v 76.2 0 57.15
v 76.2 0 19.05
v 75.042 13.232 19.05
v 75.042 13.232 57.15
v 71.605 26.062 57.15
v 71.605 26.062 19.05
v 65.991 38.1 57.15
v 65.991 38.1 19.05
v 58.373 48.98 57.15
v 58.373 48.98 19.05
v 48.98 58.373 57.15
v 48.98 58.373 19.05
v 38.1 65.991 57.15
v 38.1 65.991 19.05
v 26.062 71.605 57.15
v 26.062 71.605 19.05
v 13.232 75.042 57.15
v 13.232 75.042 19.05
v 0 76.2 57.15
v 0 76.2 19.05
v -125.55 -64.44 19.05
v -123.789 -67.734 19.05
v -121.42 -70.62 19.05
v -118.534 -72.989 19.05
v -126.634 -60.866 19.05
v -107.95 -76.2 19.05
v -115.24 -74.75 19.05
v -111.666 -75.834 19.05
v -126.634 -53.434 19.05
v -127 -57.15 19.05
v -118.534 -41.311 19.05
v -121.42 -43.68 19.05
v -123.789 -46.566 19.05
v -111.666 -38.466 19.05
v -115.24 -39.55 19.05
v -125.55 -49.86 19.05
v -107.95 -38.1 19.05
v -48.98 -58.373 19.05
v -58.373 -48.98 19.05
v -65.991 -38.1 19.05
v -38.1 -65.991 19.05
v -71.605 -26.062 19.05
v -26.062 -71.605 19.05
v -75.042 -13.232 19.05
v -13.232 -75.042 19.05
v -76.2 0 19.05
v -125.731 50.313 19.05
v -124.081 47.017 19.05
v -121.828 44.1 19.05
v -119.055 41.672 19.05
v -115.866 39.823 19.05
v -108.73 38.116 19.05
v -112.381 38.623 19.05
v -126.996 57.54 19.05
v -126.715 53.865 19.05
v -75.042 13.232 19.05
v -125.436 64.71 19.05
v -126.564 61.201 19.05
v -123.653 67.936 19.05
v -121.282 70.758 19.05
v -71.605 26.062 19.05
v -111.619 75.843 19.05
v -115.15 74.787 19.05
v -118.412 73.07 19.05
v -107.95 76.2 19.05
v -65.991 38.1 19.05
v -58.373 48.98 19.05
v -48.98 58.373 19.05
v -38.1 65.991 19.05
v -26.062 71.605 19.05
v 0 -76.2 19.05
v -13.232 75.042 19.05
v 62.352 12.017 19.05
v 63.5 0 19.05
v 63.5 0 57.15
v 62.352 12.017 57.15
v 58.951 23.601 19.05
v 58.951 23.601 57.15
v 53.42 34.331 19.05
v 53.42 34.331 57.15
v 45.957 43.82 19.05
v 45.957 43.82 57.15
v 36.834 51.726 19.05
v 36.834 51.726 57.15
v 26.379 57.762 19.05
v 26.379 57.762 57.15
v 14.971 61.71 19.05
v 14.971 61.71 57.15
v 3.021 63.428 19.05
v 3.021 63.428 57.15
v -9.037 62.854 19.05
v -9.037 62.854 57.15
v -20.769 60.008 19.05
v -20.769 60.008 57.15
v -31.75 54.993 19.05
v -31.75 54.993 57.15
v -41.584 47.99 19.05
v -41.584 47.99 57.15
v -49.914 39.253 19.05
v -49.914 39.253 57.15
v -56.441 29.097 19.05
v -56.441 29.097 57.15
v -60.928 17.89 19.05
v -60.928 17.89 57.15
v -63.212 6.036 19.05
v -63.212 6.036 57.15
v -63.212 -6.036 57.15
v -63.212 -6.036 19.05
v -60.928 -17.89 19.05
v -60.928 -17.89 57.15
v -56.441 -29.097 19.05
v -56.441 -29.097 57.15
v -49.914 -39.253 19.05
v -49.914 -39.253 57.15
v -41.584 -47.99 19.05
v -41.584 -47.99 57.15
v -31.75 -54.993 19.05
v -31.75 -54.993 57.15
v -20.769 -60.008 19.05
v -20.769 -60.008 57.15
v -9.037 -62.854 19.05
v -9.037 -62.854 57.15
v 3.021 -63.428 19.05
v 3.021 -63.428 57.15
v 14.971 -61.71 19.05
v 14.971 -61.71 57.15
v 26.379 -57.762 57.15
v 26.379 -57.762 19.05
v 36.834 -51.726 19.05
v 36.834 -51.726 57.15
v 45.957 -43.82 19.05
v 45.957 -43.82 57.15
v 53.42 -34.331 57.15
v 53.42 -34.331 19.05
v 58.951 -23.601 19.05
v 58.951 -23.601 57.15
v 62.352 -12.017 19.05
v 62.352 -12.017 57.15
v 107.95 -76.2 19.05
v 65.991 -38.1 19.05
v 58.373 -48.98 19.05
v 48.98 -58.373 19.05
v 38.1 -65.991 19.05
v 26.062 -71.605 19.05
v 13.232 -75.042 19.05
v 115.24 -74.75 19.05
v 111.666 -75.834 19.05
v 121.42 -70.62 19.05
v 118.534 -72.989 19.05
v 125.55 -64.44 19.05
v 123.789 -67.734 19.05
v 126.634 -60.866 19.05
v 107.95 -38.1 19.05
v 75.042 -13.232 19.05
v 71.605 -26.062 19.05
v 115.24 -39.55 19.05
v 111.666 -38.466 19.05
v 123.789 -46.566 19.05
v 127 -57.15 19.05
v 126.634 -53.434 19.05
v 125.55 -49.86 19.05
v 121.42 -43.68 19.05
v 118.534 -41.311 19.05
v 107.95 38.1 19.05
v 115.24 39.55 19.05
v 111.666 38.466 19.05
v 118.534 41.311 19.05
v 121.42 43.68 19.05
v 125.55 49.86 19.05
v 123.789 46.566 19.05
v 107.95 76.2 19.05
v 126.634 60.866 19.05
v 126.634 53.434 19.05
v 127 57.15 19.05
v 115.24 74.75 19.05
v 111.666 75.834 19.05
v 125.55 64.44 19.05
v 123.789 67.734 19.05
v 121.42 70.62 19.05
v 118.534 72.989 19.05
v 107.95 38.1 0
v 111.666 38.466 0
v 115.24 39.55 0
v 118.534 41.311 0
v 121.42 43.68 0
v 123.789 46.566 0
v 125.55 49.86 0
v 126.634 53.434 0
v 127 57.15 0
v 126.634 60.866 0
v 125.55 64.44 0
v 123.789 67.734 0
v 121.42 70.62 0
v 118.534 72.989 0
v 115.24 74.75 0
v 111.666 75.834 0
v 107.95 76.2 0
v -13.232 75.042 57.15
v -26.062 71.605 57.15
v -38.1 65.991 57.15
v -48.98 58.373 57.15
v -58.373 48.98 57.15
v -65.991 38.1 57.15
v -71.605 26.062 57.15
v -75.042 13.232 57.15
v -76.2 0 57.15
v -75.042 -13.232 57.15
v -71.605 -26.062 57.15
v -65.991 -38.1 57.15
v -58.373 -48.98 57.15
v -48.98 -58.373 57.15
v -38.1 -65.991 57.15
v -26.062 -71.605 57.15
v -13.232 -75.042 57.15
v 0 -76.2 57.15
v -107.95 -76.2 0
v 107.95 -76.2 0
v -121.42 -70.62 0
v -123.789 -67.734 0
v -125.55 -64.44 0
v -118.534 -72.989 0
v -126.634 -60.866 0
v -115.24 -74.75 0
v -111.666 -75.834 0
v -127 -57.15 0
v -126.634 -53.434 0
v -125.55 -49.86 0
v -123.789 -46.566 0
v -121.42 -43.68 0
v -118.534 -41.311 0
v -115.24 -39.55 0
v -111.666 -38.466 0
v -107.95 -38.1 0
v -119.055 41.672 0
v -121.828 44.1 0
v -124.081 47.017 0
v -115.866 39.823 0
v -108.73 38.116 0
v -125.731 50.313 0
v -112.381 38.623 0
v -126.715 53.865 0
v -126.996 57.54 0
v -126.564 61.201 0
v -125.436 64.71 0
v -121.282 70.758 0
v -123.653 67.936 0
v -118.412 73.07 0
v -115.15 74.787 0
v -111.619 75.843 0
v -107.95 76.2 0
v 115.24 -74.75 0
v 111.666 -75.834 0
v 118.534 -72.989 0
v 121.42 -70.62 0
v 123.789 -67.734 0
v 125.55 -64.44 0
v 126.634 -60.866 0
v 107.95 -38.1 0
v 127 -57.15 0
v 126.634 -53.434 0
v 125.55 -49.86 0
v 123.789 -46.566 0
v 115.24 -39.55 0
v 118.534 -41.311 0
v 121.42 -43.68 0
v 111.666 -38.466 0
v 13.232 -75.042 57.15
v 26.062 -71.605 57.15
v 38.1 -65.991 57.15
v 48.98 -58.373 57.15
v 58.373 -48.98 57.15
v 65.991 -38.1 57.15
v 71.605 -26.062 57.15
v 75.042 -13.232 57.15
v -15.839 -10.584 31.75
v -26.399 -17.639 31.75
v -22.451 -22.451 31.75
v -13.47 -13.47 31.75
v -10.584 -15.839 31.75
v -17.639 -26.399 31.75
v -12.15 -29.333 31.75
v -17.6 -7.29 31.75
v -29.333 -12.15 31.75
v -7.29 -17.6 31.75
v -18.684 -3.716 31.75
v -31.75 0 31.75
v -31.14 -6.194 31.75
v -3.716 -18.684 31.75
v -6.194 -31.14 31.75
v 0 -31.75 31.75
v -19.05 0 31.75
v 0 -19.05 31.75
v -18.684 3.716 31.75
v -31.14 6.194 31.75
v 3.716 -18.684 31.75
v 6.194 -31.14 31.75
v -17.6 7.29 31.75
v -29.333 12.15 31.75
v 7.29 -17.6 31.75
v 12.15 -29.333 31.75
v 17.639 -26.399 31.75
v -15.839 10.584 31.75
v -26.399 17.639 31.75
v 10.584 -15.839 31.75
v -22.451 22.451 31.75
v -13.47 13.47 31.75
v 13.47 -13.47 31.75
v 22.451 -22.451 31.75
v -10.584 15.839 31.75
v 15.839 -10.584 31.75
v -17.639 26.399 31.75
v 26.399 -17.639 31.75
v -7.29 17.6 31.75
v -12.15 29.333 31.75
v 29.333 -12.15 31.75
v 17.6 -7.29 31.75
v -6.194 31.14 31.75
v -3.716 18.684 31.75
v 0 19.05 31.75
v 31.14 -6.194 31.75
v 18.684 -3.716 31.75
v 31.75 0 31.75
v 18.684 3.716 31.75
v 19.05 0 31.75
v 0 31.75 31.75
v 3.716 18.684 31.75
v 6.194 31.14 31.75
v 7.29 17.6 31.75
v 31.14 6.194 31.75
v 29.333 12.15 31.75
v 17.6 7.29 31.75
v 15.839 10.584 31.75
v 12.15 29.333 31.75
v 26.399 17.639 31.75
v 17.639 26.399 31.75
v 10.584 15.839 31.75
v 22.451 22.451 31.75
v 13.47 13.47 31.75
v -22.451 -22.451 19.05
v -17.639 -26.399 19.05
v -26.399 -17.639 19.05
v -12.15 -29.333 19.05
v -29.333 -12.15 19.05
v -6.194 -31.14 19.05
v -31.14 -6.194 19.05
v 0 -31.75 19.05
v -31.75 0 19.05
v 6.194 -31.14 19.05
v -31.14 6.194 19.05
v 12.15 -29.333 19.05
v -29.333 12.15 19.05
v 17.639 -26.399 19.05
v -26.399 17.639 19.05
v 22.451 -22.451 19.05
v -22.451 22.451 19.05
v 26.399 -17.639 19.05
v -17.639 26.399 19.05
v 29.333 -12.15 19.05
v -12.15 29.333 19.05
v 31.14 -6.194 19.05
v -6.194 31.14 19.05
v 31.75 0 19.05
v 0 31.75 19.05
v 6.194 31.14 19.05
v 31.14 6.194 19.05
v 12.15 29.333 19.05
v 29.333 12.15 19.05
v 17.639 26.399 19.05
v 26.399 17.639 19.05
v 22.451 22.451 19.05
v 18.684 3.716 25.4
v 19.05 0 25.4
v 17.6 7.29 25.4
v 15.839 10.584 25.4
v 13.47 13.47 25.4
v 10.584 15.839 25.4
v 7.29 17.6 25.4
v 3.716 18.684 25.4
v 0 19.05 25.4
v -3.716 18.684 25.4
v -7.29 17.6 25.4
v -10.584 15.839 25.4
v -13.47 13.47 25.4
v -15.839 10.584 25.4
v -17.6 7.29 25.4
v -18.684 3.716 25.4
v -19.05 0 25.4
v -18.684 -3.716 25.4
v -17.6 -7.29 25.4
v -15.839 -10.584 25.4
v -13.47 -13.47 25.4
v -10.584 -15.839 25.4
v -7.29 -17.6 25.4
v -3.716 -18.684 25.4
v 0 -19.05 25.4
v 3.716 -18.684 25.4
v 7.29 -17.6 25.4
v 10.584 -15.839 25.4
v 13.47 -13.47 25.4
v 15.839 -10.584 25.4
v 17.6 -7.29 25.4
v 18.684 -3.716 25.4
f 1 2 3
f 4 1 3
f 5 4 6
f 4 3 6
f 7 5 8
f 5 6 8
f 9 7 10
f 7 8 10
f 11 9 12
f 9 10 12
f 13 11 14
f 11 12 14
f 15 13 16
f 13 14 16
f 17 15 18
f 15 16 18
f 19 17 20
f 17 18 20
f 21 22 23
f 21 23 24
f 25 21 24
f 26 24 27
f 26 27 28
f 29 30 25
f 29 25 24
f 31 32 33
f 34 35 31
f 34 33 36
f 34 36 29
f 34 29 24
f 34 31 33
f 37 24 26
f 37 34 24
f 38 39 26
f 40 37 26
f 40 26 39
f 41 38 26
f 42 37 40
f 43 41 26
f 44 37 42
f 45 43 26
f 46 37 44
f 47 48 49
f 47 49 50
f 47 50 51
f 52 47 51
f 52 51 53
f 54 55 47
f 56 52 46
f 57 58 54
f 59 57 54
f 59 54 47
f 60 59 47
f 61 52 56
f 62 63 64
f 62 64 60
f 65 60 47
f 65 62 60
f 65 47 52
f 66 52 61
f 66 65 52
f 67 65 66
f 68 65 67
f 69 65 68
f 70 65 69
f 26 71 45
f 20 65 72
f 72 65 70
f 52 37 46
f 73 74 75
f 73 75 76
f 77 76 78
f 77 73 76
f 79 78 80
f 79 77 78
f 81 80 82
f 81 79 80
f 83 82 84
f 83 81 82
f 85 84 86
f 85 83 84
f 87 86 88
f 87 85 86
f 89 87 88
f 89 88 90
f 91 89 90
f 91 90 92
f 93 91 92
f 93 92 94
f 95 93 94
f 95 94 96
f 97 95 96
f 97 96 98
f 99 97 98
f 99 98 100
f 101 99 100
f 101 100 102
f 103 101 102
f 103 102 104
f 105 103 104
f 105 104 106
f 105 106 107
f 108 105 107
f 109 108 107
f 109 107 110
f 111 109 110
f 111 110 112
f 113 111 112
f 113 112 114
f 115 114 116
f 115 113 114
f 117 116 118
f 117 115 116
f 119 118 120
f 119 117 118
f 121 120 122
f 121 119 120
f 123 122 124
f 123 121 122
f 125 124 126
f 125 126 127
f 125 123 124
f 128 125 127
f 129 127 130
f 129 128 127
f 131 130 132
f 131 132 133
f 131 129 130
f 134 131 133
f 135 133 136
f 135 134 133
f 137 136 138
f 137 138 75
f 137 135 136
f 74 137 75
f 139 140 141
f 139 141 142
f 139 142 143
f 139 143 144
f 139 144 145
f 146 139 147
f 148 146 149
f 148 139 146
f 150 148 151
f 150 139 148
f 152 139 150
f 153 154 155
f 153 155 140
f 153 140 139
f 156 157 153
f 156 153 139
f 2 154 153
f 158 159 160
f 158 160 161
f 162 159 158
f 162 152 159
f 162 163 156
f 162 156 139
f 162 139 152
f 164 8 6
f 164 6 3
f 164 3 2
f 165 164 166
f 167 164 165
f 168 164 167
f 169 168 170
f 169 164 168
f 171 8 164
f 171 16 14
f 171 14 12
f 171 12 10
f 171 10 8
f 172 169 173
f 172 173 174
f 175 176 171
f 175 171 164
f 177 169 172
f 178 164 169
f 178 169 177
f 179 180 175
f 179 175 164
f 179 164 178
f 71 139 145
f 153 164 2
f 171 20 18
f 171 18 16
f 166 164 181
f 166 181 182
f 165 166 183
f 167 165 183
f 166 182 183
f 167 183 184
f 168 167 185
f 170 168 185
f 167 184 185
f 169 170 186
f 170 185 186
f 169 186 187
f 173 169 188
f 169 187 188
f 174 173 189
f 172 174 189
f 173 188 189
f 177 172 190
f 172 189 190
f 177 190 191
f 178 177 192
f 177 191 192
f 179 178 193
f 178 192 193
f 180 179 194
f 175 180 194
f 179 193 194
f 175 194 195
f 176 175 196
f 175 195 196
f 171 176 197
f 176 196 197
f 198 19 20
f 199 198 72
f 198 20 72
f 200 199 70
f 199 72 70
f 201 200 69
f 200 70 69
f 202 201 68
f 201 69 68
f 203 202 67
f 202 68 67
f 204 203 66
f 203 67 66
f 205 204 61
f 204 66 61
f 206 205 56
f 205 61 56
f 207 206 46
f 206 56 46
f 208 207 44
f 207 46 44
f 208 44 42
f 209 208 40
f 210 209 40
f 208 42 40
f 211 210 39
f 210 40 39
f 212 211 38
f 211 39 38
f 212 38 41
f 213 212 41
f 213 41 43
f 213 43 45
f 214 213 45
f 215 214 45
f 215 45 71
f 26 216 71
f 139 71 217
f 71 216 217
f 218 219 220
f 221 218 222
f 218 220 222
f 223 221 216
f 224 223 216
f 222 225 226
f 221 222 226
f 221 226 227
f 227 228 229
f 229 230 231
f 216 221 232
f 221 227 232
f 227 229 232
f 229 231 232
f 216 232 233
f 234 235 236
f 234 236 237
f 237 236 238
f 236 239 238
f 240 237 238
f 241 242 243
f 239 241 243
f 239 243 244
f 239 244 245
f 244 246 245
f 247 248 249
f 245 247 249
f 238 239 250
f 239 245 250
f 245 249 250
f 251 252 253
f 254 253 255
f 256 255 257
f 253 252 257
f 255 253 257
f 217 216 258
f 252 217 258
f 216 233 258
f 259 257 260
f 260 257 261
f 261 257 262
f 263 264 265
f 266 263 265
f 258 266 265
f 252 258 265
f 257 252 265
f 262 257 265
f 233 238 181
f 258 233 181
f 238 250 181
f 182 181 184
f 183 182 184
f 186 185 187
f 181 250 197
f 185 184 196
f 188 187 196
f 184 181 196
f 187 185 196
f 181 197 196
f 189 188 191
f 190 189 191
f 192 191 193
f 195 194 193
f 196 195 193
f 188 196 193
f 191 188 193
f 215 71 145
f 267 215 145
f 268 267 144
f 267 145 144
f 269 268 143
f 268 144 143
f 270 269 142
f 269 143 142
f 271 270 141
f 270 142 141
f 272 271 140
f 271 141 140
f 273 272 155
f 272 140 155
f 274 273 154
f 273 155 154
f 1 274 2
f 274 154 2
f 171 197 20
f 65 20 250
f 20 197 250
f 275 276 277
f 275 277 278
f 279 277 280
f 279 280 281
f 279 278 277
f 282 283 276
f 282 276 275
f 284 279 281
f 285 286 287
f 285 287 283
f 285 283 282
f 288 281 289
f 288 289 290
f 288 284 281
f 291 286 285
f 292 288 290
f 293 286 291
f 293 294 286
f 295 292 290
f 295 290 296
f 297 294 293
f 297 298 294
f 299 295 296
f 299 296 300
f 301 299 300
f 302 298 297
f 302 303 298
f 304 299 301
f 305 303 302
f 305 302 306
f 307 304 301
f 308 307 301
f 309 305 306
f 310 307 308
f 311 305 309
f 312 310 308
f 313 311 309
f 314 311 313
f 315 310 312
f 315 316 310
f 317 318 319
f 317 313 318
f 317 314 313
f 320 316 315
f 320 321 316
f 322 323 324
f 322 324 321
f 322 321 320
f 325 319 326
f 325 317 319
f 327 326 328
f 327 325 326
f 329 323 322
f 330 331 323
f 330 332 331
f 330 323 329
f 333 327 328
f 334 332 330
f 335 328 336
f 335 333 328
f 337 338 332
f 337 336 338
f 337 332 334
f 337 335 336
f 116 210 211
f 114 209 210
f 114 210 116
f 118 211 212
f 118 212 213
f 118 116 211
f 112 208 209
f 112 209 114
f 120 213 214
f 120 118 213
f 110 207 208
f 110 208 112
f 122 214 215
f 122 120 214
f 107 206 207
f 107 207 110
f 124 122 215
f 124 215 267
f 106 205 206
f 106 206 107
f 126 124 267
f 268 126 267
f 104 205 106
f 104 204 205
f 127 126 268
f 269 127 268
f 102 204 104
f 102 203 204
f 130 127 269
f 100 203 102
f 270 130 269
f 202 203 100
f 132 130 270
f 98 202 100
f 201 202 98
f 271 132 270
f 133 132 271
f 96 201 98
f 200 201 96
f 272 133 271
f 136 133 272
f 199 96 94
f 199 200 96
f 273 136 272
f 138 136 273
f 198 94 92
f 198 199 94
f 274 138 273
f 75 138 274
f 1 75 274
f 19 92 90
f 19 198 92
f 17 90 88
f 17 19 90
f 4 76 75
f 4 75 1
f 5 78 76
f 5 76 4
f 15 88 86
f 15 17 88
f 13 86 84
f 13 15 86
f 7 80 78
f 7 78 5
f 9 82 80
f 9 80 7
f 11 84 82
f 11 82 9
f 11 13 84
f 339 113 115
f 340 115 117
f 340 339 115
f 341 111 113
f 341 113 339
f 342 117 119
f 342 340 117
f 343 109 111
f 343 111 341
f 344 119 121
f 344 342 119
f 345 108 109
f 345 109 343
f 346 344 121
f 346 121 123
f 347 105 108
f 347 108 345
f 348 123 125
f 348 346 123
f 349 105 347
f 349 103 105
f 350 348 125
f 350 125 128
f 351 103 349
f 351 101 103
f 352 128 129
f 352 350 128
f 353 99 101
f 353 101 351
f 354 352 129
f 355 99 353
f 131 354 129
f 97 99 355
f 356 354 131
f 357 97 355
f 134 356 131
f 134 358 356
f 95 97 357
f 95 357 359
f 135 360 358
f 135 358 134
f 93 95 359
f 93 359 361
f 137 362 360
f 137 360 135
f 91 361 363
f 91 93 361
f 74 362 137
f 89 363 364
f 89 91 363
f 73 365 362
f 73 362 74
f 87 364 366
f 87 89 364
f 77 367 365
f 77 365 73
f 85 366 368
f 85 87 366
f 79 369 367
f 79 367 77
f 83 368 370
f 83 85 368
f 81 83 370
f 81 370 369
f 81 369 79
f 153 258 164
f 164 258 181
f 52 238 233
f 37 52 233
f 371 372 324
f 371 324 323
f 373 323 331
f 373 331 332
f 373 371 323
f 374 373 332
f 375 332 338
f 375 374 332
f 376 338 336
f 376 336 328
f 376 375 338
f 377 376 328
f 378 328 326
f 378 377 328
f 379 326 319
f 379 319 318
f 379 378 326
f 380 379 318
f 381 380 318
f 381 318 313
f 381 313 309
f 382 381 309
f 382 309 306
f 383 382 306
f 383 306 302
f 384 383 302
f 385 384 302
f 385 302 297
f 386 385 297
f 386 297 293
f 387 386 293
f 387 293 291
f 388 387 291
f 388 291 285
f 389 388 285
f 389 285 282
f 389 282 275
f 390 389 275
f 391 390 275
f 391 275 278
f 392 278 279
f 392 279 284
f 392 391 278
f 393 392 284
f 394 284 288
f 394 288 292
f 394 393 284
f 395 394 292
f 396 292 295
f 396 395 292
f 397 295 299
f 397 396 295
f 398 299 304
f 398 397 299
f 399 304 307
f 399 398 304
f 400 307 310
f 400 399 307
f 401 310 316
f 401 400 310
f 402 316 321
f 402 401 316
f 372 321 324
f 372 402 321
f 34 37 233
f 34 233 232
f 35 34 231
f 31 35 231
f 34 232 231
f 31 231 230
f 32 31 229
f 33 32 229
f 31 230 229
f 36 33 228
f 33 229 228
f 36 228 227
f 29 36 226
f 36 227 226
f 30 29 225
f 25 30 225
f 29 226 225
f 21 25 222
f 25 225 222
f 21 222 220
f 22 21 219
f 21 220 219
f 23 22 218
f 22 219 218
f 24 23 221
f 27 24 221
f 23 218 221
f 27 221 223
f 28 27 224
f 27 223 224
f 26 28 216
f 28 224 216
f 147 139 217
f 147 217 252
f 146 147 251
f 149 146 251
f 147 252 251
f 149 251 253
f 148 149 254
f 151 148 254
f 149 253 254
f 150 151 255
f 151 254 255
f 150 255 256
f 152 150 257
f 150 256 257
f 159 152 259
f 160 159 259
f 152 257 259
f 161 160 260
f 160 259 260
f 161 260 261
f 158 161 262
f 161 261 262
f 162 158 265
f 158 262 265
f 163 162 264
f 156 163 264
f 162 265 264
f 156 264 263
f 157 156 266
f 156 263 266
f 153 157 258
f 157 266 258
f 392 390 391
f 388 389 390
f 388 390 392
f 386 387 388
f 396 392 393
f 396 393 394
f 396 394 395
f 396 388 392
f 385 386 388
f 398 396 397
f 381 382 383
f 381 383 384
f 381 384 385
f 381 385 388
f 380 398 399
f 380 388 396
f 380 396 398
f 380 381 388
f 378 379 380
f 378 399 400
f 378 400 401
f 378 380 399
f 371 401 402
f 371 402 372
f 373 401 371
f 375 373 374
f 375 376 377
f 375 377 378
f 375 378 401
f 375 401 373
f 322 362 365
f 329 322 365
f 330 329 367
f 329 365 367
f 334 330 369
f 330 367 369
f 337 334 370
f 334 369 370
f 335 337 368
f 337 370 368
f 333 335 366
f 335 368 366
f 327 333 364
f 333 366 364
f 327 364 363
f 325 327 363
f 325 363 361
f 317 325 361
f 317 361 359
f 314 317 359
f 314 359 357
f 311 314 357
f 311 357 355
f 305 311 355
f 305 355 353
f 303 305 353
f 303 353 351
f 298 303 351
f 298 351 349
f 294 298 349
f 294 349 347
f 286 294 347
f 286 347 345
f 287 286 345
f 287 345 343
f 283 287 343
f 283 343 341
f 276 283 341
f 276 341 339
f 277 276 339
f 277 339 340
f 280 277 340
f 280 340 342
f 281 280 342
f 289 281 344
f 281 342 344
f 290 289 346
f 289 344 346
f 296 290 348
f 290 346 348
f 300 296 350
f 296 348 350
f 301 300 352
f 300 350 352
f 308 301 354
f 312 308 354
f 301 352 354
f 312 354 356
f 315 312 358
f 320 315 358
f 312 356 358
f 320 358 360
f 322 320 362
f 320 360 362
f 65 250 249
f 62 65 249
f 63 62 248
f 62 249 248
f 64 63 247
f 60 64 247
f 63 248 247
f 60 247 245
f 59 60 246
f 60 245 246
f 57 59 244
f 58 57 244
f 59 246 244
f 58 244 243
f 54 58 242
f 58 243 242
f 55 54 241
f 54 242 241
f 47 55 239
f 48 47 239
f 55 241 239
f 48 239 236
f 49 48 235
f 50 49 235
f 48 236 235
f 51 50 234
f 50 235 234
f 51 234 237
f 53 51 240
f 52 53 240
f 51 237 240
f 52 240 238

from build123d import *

# Parameters (mm, degrees)
F0_R     = 63.5
F0_R_2   = 31.75
F0_R_3   = 19.05
F1_DEPTH = 19.05
F2_DEPTH = 57.15
F3_DEPTH = 31.75
F4_DEPTH = 25.4


with BuildPart() as f1:
    # F0 (on Top) → F1 (new body)
    with BuildSketch(Plane.XY):
        with BuildLine():
            ThreePointArc((0, 76.2), (53.881537, 53.881537), (76.2, 0))
            ThreePointArc((76.2, 0), (53.881537, -53.881537), (0, -76.2))
            Line((0, -76.2), (107.95, -76.2))
            ThreePointArc((107.95, -76.2), (127, -57.15), (107.95, -38.1))
            Line((107.95, -38.1), (107.95, 38.1))
            ThreePointArc((107.95, 38.1), (127, 57.15), (107.95, 76.2))
            Line((107.95, 76.2), (0, 76.2))
        make_face()
        with BuildLine():
            ThreePointArc((0, -76.2), (-76.2, 0), (0, 76.2))
            Line((0, 76.2), (-107.95, 76.2))
            ThreePointArc((-107.95, 76.2), (-126.996003, 57.540236), (-108.730309, 38.115988))
            Line((-108.730309, 38.115988), (-107.95, -38.1))
            ThreePointArc((-107.95, -38.1), (-127, -57.15), (-107.95, -76.2))
            Line((-107.95, -76.2), (0, -76.2))
        make_face()
        with BuildLine():
            ThreePointArc((0, -76.2), (53.881537, -53.881537), (76.2, 0))
            ThreePointArc((76.2, 0), (53.881537, 53.881537), (0, 76.2))
            ThreePointArc((0, 76.2), (-76.2, 0), (0, -76.2))
        make_face()
        Circle(F0_R, mode=Mode.SUBTRACT)
        Circle(F0_R)
        Circle(F0_R_2, mode=Mode.SUBTRACT)
        Circle(F0_R_2)
        Circle(F0_R_3, mode=Mode.SUBTRACT)
        Circle(F0_R_3)
    extrude(amount=F1_DEPTH)

    # F0 (on Top) → F2 (join)
    with BuildSketch(Plane.XY):
        with BuildLine():
            ThreePointArc((0, -76.2), (53.881537, -53.881537), (76.2, 0))
            ThreePointArc((76.2, 0), (53.881537, 53.881537), (0, 76.2))
            ThreePointArc((0, 76.2), (-76.2, 0), (0, -76.2))
        make_face()
        Circle(F0_R, mode=Mode.SUBTRACT)
    extrude(amount=F2_DEPTH)

    # F0 (on Top) → F3 (join)
    with BuildSketch(Plane.XY):
        Circle(F0_R_2)
        Circle(F0_R_3, mode=Mode.SUBTRACT)
    extrude(amount=F3_DEPTH)

    # F0 (on Top) → F4 (join)
    with BuildSketch(Plane.XY):
        Circle(F0_R_3)
    extrude(amount=F4_DEPTH)


solid = f1.part
